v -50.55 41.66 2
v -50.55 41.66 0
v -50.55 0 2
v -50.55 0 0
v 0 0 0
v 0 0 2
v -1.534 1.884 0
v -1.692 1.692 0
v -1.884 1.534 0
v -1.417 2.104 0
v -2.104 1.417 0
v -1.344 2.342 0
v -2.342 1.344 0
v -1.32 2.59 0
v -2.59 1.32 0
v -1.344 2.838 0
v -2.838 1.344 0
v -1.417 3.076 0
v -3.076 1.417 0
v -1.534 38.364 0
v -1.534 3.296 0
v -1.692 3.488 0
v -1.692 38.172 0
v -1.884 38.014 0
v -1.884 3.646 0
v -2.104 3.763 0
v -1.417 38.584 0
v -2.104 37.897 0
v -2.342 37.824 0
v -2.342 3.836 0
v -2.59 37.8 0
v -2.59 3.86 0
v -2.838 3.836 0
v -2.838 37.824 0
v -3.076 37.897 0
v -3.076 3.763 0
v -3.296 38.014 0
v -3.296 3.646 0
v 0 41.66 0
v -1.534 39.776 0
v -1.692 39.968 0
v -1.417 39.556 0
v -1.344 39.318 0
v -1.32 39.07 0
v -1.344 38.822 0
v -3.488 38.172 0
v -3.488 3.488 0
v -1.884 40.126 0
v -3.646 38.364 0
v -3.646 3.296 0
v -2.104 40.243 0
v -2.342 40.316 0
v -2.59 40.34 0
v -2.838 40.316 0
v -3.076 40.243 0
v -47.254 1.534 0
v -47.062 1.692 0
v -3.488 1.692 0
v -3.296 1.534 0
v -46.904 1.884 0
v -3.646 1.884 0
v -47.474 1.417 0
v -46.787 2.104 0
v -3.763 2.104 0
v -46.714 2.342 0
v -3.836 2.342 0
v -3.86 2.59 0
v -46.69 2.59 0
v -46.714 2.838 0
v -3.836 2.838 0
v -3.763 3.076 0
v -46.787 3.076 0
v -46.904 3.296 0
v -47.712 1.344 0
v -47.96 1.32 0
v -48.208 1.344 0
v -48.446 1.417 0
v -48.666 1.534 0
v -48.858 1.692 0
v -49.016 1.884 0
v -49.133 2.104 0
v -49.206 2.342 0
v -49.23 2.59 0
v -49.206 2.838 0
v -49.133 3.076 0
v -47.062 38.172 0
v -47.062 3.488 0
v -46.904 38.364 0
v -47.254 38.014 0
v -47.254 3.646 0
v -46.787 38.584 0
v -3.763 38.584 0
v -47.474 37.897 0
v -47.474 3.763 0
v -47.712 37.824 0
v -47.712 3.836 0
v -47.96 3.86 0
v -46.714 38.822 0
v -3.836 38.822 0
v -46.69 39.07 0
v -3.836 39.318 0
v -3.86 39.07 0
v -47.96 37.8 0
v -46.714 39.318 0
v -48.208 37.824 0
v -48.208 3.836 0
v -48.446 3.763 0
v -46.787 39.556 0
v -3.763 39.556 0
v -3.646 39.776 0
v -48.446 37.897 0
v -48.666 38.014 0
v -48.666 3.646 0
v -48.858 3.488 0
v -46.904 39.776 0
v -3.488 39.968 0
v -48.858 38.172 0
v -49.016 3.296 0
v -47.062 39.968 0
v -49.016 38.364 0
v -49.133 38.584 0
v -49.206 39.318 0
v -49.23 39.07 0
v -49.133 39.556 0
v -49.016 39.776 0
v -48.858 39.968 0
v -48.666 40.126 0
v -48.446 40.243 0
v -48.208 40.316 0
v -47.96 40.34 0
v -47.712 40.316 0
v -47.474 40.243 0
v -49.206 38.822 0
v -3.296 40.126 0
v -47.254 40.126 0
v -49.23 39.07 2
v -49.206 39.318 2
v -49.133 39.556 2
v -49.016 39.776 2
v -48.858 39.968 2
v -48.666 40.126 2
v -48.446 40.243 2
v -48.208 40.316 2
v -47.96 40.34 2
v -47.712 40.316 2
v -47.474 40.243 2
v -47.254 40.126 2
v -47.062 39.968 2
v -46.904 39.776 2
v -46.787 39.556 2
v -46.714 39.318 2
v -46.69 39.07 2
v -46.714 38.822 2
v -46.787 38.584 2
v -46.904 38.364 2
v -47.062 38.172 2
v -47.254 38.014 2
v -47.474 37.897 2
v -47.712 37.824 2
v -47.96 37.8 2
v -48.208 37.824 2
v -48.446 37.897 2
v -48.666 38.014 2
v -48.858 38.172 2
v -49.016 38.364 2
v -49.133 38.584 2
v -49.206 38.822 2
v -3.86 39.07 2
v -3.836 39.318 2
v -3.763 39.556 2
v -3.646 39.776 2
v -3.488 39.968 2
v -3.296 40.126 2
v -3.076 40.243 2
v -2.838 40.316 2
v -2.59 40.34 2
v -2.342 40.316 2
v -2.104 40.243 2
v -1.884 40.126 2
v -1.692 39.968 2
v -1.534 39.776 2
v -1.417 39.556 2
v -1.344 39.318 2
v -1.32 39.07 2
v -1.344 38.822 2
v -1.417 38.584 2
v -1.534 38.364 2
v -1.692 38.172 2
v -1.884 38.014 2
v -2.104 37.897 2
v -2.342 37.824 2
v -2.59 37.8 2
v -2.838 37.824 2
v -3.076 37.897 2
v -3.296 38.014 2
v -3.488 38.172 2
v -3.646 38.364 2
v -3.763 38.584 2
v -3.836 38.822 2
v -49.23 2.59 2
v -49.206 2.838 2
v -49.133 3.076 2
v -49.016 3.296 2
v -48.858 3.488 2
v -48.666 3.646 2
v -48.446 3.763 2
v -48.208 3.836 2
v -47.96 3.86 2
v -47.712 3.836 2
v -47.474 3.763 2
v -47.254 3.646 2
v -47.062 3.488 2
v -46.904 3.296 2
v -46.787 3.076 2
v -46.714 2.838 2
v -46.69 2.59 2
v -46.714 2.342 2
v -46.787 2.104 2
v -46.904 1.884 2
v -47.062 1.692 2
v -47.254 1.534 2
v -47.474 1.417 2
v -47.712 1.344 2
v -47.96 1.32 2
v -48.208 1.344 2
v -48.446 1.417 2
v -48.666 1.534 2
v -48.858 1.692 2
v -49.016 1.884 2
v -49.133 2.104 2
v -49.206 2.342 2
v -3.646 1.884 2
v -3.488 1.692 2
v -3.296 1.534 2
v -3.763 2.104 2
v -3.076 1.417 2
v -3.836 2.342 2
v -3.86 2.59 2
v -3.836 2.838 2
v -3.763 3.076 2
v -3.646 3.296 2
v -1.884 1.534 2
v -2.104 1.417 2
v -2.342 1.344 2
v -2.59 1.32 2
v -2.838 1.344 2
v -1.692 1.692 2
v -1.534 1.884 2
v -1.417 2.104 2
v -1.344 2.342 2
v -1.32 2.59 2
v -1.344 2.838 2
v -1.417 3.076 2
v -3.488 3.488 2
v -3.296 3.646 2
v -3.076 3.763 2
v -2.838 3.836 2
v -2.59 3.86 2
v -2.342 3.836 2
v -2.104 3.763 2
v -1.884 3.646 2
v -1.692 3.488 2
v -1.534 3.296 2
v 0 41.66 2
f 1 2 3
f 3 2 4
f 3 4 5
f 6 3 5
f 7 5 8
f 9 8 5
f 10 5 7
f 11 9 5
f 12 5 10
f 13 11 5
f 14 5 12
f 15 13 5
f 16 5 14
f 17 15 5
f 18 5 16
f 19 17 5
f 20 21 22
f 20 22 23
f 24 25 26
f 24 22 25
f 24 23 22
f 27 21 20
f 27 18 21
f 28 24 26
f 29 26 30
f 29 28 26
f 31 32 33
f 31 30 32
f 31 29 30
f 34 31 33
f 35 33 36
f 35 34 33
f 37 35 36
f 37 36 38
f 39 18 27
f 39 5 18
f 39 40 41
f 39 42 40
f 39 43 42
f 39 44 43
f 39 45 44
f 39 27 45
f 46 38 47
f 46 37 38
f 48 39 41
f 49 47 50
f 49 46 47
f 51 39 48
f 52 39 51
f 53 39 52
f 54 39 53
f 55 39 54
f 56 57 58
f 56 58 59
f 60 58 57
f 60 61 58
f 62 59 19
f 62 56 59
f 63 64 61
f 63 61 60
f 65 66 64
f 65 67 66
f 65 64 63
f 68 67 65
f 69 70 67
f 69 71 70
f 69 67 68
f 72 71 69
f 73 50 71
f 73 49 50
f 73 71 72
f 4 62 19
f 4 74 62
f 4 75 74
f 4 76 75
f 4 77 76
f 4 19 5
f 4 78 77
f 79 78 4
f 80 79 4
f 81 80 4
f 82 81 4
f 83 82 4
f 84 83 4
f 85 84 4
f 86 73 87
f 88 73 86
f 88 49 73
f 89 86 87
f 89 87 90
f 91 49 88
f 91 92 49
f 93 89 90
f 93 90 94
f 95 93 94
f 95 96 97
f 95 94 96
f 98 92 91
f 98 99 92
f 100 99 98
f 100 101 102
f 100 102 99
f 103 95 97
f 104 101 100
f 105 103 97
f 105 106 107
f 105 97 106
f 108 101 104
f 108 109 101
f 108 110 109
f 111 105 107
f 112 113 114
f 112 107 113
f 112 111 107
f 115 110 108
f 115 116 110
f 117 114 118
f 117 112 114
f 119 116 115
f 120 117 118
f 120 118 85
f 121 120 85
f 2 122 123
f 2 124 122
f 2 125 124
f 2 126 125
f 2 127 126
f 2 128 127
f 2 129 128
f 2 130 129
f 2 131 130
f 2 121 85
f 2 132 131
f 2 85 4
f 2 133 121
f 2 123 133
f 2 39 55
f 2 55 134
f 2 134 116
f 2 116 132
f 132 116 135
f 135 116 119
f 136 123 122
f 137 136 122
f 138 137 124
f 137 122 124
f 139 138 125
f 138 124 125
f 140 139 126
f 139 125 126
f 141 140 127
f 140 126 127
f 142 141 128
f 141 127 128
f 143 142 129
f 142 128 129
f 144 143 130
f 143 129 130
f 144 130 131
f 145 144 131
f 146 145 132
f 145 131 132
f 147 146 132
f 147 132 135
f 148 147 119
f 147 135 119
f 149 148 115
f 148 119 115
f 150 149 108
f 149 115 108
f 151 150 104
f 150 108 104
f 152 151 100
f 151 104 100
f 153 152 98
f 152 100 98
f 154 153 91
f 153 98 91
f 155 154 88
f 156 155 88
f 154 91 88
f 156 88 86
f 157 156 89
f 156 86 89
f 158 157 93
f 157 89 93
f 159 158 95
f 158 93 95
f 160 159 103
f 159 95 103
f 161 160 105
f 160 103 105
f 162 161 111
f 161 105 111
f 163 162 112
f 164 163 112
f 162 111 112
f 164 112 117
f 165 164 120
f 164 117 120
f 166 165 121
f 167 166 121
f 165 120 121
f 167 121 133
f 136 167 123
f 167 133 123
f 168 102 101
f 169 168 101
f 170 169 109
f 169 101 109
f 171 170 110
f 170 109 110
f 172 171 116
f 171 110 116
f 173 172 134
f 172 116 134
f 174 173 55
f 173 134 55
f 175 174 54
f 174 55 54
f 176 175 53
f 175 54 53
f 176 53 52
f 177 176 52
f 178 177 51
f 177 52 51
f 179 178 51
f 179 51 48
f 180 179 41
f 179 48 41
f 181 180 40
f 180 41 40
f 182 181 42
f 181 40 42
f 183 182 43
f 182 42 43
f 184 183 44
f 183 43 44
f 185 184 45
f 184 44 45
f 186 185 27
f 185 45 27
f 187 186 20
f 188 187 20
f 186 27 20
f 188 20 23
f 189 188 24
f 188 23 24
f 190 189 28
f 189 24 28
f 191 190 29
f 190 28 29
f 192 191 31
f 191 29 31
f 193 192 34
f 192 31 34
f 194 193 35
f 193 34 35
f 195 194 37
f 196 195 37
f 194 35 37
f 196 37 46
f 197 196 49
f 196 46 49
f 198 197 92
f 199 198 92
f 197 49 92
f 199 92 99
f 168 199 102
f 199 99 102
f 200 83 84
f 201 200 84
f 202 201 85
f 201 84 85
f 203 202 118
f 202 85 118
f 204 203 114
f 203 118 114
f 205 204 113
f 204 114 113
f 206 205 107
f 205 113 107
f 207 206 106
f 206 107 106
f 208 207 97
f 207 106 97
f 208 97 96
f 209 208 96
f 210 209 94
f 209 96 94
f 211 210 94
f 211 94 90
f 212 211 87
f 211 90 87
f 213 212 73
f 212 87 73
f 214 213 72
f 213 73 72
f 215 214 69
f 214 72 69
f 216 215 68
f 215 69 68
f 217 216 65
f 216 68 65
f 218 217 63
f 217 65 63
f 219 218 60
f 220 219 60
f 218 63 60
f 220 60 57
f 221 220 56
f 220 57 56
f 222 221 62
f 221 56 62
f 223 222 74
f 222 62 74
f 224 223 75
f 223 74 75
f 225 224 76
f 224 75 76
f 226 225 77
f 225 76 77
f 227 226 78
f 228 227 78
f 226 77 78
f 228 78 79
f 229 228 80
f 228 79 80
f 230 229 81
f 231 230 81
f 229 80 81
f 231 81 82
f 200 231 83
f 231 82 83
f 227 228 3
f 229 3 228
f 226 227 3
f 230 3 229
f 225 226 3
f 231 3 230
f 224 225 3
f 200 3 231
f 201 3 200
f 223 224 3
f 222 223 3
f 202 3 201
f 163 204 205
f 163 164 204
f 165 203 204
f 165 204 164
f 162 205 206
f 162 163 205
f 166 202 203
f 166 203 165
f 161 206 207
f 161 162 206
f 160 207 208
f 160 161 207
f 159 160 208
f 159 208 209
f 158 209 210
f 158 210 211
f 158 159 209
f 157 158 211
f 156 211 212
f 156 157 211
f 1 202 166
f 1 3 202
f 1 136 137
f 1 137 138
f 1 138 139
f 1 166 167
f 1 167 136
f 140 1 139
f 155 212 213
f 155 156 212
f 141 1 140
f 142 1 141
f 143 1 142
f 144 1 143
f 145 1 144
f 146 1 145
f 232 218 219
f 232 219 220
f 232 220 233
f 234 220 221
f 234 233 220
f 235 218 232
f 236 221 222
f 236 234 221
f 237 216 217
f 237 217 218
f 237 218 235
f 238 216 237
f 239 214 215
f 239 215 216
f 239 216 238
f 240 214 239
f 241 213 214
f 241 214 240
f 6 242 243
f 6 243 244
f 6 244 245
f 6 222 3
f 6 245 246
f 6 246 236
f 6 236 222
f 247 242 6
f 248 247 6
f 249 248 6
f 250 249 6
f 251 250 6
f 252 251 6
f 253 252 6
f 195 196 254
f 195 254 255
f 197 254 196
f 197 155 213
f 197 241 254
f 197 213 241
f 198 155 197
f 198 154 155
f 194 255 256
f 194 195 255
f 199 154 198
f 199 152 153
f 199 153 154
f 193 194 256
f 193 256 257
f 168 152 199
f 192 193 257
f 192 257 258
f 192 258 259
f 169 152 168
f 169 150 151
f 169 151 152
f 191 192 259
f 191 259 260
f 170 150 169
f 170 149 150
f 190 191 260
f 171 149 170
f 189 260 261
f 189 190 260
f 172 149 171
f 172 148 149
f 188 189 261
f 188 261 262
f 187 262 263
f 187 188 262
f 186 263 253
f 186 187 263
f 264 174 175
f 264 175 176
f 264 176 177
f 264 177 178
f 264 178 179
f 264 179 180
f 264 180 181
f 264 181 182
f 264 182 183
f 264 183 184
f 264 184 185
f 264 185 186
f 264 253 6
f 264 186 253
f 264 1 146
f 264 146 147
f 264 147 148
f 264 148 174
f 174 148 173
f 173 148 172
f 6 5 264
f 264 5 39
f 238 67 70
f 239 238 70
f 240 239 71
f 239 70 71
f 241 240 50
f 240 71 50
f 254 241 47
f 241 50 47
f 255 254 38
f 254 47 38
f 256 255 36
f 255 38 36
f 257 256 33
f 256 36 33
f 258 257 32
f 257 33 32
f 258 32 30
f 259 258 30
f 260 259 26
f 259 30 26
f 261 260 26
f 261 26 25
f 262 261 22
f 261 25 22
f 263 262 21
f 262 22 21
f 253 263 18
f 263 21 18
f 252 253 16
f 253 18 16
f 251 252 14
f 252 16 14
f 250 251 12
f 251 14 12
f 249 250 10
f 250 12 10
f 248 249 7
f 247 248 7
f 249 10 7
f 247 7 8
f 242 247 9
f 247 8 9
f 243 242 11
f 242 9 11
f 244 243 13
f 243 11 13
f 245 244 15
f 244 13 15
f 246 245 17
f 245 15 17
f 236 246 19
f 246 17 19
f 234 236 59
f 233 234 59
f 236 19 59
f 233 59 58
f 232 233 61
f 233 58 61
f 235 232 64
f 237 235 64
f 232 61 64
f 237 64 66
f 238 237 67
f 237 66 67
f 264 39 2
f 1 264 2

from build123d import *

# Parameters (mm, degrees)
SKETCH1_W           = 46.55
SKETCH1_H           = 2
BOSS_EXTRUDE1_DEPTH = 2
SKETCH11_W          = 46.55
SKETCH11_H          = 37.66
BOSS_EXTRUDE3_DEPTH = 2
SKETCH12_R          = 1.27
CUT_EXTRUDE6_DEPTH  = 2


with BuildPart() as part:
    # Sketch1 → Boss-Extrude1 (new body)
    with BuildSketch(Plane.XY):
        with Locations((-25.275, 40.66)):
            Rectangle(SKETCH1_W, SKETCH1_H)
        Polygon((-2, 0), (0, 0), (0, 41.66), (-2, 41.66), (-2, 39.66), (-2, 2), align=None)
        Polygon((-50.55, 0), (-48.55, 0), (-48.55, 2), (-48.55, 39.66), (-48.55, 41.66), (-50.55, 41.66), align=None)
        with Locations((-25.275, 1)):
            Rectangle(SKETCH1_W, SKETCH1_H)
    extrude(amount=BOSS_EXTRUDE1_DEPTH)

    # Sketch11 → Boss-Extrude3 (add)
    with BuildSketch(Plane(origin=(0, 0, 0), x_dir=(-1, 0, 0), z_dir=(0, 0, -1))):
        with Locations((25.275, 20.83)):
            Rectangle(SKETCH11_W, SKETCH11_H)
    extrude(amount=-BOSS_EXTRUDE3_DEPTH)

    # Sketch12 → Cut-Extrude6 (cut)
    with BuildSketch(Plane(origin=(0, 0, 0), x_dir=(-1, 0, 0), z_dir=(0, 0, -1))):
        with Locations((2.59, 39.07)):
            Circle(SKETCH12_R)
        with Locations((47.96, 39.07)):
            Circle(SKETCH12_R)
        with Locations((2.59, 2.59)):
            Circle(SKETCH12_R)
        with Locations((47.96, 2.59)):
            Circle(SKETCH12_R)
    extrude(amount=-CUT_EXTRUDE6_DEPTH, mode=Mode.SUBTRACT)


solid = part.part
